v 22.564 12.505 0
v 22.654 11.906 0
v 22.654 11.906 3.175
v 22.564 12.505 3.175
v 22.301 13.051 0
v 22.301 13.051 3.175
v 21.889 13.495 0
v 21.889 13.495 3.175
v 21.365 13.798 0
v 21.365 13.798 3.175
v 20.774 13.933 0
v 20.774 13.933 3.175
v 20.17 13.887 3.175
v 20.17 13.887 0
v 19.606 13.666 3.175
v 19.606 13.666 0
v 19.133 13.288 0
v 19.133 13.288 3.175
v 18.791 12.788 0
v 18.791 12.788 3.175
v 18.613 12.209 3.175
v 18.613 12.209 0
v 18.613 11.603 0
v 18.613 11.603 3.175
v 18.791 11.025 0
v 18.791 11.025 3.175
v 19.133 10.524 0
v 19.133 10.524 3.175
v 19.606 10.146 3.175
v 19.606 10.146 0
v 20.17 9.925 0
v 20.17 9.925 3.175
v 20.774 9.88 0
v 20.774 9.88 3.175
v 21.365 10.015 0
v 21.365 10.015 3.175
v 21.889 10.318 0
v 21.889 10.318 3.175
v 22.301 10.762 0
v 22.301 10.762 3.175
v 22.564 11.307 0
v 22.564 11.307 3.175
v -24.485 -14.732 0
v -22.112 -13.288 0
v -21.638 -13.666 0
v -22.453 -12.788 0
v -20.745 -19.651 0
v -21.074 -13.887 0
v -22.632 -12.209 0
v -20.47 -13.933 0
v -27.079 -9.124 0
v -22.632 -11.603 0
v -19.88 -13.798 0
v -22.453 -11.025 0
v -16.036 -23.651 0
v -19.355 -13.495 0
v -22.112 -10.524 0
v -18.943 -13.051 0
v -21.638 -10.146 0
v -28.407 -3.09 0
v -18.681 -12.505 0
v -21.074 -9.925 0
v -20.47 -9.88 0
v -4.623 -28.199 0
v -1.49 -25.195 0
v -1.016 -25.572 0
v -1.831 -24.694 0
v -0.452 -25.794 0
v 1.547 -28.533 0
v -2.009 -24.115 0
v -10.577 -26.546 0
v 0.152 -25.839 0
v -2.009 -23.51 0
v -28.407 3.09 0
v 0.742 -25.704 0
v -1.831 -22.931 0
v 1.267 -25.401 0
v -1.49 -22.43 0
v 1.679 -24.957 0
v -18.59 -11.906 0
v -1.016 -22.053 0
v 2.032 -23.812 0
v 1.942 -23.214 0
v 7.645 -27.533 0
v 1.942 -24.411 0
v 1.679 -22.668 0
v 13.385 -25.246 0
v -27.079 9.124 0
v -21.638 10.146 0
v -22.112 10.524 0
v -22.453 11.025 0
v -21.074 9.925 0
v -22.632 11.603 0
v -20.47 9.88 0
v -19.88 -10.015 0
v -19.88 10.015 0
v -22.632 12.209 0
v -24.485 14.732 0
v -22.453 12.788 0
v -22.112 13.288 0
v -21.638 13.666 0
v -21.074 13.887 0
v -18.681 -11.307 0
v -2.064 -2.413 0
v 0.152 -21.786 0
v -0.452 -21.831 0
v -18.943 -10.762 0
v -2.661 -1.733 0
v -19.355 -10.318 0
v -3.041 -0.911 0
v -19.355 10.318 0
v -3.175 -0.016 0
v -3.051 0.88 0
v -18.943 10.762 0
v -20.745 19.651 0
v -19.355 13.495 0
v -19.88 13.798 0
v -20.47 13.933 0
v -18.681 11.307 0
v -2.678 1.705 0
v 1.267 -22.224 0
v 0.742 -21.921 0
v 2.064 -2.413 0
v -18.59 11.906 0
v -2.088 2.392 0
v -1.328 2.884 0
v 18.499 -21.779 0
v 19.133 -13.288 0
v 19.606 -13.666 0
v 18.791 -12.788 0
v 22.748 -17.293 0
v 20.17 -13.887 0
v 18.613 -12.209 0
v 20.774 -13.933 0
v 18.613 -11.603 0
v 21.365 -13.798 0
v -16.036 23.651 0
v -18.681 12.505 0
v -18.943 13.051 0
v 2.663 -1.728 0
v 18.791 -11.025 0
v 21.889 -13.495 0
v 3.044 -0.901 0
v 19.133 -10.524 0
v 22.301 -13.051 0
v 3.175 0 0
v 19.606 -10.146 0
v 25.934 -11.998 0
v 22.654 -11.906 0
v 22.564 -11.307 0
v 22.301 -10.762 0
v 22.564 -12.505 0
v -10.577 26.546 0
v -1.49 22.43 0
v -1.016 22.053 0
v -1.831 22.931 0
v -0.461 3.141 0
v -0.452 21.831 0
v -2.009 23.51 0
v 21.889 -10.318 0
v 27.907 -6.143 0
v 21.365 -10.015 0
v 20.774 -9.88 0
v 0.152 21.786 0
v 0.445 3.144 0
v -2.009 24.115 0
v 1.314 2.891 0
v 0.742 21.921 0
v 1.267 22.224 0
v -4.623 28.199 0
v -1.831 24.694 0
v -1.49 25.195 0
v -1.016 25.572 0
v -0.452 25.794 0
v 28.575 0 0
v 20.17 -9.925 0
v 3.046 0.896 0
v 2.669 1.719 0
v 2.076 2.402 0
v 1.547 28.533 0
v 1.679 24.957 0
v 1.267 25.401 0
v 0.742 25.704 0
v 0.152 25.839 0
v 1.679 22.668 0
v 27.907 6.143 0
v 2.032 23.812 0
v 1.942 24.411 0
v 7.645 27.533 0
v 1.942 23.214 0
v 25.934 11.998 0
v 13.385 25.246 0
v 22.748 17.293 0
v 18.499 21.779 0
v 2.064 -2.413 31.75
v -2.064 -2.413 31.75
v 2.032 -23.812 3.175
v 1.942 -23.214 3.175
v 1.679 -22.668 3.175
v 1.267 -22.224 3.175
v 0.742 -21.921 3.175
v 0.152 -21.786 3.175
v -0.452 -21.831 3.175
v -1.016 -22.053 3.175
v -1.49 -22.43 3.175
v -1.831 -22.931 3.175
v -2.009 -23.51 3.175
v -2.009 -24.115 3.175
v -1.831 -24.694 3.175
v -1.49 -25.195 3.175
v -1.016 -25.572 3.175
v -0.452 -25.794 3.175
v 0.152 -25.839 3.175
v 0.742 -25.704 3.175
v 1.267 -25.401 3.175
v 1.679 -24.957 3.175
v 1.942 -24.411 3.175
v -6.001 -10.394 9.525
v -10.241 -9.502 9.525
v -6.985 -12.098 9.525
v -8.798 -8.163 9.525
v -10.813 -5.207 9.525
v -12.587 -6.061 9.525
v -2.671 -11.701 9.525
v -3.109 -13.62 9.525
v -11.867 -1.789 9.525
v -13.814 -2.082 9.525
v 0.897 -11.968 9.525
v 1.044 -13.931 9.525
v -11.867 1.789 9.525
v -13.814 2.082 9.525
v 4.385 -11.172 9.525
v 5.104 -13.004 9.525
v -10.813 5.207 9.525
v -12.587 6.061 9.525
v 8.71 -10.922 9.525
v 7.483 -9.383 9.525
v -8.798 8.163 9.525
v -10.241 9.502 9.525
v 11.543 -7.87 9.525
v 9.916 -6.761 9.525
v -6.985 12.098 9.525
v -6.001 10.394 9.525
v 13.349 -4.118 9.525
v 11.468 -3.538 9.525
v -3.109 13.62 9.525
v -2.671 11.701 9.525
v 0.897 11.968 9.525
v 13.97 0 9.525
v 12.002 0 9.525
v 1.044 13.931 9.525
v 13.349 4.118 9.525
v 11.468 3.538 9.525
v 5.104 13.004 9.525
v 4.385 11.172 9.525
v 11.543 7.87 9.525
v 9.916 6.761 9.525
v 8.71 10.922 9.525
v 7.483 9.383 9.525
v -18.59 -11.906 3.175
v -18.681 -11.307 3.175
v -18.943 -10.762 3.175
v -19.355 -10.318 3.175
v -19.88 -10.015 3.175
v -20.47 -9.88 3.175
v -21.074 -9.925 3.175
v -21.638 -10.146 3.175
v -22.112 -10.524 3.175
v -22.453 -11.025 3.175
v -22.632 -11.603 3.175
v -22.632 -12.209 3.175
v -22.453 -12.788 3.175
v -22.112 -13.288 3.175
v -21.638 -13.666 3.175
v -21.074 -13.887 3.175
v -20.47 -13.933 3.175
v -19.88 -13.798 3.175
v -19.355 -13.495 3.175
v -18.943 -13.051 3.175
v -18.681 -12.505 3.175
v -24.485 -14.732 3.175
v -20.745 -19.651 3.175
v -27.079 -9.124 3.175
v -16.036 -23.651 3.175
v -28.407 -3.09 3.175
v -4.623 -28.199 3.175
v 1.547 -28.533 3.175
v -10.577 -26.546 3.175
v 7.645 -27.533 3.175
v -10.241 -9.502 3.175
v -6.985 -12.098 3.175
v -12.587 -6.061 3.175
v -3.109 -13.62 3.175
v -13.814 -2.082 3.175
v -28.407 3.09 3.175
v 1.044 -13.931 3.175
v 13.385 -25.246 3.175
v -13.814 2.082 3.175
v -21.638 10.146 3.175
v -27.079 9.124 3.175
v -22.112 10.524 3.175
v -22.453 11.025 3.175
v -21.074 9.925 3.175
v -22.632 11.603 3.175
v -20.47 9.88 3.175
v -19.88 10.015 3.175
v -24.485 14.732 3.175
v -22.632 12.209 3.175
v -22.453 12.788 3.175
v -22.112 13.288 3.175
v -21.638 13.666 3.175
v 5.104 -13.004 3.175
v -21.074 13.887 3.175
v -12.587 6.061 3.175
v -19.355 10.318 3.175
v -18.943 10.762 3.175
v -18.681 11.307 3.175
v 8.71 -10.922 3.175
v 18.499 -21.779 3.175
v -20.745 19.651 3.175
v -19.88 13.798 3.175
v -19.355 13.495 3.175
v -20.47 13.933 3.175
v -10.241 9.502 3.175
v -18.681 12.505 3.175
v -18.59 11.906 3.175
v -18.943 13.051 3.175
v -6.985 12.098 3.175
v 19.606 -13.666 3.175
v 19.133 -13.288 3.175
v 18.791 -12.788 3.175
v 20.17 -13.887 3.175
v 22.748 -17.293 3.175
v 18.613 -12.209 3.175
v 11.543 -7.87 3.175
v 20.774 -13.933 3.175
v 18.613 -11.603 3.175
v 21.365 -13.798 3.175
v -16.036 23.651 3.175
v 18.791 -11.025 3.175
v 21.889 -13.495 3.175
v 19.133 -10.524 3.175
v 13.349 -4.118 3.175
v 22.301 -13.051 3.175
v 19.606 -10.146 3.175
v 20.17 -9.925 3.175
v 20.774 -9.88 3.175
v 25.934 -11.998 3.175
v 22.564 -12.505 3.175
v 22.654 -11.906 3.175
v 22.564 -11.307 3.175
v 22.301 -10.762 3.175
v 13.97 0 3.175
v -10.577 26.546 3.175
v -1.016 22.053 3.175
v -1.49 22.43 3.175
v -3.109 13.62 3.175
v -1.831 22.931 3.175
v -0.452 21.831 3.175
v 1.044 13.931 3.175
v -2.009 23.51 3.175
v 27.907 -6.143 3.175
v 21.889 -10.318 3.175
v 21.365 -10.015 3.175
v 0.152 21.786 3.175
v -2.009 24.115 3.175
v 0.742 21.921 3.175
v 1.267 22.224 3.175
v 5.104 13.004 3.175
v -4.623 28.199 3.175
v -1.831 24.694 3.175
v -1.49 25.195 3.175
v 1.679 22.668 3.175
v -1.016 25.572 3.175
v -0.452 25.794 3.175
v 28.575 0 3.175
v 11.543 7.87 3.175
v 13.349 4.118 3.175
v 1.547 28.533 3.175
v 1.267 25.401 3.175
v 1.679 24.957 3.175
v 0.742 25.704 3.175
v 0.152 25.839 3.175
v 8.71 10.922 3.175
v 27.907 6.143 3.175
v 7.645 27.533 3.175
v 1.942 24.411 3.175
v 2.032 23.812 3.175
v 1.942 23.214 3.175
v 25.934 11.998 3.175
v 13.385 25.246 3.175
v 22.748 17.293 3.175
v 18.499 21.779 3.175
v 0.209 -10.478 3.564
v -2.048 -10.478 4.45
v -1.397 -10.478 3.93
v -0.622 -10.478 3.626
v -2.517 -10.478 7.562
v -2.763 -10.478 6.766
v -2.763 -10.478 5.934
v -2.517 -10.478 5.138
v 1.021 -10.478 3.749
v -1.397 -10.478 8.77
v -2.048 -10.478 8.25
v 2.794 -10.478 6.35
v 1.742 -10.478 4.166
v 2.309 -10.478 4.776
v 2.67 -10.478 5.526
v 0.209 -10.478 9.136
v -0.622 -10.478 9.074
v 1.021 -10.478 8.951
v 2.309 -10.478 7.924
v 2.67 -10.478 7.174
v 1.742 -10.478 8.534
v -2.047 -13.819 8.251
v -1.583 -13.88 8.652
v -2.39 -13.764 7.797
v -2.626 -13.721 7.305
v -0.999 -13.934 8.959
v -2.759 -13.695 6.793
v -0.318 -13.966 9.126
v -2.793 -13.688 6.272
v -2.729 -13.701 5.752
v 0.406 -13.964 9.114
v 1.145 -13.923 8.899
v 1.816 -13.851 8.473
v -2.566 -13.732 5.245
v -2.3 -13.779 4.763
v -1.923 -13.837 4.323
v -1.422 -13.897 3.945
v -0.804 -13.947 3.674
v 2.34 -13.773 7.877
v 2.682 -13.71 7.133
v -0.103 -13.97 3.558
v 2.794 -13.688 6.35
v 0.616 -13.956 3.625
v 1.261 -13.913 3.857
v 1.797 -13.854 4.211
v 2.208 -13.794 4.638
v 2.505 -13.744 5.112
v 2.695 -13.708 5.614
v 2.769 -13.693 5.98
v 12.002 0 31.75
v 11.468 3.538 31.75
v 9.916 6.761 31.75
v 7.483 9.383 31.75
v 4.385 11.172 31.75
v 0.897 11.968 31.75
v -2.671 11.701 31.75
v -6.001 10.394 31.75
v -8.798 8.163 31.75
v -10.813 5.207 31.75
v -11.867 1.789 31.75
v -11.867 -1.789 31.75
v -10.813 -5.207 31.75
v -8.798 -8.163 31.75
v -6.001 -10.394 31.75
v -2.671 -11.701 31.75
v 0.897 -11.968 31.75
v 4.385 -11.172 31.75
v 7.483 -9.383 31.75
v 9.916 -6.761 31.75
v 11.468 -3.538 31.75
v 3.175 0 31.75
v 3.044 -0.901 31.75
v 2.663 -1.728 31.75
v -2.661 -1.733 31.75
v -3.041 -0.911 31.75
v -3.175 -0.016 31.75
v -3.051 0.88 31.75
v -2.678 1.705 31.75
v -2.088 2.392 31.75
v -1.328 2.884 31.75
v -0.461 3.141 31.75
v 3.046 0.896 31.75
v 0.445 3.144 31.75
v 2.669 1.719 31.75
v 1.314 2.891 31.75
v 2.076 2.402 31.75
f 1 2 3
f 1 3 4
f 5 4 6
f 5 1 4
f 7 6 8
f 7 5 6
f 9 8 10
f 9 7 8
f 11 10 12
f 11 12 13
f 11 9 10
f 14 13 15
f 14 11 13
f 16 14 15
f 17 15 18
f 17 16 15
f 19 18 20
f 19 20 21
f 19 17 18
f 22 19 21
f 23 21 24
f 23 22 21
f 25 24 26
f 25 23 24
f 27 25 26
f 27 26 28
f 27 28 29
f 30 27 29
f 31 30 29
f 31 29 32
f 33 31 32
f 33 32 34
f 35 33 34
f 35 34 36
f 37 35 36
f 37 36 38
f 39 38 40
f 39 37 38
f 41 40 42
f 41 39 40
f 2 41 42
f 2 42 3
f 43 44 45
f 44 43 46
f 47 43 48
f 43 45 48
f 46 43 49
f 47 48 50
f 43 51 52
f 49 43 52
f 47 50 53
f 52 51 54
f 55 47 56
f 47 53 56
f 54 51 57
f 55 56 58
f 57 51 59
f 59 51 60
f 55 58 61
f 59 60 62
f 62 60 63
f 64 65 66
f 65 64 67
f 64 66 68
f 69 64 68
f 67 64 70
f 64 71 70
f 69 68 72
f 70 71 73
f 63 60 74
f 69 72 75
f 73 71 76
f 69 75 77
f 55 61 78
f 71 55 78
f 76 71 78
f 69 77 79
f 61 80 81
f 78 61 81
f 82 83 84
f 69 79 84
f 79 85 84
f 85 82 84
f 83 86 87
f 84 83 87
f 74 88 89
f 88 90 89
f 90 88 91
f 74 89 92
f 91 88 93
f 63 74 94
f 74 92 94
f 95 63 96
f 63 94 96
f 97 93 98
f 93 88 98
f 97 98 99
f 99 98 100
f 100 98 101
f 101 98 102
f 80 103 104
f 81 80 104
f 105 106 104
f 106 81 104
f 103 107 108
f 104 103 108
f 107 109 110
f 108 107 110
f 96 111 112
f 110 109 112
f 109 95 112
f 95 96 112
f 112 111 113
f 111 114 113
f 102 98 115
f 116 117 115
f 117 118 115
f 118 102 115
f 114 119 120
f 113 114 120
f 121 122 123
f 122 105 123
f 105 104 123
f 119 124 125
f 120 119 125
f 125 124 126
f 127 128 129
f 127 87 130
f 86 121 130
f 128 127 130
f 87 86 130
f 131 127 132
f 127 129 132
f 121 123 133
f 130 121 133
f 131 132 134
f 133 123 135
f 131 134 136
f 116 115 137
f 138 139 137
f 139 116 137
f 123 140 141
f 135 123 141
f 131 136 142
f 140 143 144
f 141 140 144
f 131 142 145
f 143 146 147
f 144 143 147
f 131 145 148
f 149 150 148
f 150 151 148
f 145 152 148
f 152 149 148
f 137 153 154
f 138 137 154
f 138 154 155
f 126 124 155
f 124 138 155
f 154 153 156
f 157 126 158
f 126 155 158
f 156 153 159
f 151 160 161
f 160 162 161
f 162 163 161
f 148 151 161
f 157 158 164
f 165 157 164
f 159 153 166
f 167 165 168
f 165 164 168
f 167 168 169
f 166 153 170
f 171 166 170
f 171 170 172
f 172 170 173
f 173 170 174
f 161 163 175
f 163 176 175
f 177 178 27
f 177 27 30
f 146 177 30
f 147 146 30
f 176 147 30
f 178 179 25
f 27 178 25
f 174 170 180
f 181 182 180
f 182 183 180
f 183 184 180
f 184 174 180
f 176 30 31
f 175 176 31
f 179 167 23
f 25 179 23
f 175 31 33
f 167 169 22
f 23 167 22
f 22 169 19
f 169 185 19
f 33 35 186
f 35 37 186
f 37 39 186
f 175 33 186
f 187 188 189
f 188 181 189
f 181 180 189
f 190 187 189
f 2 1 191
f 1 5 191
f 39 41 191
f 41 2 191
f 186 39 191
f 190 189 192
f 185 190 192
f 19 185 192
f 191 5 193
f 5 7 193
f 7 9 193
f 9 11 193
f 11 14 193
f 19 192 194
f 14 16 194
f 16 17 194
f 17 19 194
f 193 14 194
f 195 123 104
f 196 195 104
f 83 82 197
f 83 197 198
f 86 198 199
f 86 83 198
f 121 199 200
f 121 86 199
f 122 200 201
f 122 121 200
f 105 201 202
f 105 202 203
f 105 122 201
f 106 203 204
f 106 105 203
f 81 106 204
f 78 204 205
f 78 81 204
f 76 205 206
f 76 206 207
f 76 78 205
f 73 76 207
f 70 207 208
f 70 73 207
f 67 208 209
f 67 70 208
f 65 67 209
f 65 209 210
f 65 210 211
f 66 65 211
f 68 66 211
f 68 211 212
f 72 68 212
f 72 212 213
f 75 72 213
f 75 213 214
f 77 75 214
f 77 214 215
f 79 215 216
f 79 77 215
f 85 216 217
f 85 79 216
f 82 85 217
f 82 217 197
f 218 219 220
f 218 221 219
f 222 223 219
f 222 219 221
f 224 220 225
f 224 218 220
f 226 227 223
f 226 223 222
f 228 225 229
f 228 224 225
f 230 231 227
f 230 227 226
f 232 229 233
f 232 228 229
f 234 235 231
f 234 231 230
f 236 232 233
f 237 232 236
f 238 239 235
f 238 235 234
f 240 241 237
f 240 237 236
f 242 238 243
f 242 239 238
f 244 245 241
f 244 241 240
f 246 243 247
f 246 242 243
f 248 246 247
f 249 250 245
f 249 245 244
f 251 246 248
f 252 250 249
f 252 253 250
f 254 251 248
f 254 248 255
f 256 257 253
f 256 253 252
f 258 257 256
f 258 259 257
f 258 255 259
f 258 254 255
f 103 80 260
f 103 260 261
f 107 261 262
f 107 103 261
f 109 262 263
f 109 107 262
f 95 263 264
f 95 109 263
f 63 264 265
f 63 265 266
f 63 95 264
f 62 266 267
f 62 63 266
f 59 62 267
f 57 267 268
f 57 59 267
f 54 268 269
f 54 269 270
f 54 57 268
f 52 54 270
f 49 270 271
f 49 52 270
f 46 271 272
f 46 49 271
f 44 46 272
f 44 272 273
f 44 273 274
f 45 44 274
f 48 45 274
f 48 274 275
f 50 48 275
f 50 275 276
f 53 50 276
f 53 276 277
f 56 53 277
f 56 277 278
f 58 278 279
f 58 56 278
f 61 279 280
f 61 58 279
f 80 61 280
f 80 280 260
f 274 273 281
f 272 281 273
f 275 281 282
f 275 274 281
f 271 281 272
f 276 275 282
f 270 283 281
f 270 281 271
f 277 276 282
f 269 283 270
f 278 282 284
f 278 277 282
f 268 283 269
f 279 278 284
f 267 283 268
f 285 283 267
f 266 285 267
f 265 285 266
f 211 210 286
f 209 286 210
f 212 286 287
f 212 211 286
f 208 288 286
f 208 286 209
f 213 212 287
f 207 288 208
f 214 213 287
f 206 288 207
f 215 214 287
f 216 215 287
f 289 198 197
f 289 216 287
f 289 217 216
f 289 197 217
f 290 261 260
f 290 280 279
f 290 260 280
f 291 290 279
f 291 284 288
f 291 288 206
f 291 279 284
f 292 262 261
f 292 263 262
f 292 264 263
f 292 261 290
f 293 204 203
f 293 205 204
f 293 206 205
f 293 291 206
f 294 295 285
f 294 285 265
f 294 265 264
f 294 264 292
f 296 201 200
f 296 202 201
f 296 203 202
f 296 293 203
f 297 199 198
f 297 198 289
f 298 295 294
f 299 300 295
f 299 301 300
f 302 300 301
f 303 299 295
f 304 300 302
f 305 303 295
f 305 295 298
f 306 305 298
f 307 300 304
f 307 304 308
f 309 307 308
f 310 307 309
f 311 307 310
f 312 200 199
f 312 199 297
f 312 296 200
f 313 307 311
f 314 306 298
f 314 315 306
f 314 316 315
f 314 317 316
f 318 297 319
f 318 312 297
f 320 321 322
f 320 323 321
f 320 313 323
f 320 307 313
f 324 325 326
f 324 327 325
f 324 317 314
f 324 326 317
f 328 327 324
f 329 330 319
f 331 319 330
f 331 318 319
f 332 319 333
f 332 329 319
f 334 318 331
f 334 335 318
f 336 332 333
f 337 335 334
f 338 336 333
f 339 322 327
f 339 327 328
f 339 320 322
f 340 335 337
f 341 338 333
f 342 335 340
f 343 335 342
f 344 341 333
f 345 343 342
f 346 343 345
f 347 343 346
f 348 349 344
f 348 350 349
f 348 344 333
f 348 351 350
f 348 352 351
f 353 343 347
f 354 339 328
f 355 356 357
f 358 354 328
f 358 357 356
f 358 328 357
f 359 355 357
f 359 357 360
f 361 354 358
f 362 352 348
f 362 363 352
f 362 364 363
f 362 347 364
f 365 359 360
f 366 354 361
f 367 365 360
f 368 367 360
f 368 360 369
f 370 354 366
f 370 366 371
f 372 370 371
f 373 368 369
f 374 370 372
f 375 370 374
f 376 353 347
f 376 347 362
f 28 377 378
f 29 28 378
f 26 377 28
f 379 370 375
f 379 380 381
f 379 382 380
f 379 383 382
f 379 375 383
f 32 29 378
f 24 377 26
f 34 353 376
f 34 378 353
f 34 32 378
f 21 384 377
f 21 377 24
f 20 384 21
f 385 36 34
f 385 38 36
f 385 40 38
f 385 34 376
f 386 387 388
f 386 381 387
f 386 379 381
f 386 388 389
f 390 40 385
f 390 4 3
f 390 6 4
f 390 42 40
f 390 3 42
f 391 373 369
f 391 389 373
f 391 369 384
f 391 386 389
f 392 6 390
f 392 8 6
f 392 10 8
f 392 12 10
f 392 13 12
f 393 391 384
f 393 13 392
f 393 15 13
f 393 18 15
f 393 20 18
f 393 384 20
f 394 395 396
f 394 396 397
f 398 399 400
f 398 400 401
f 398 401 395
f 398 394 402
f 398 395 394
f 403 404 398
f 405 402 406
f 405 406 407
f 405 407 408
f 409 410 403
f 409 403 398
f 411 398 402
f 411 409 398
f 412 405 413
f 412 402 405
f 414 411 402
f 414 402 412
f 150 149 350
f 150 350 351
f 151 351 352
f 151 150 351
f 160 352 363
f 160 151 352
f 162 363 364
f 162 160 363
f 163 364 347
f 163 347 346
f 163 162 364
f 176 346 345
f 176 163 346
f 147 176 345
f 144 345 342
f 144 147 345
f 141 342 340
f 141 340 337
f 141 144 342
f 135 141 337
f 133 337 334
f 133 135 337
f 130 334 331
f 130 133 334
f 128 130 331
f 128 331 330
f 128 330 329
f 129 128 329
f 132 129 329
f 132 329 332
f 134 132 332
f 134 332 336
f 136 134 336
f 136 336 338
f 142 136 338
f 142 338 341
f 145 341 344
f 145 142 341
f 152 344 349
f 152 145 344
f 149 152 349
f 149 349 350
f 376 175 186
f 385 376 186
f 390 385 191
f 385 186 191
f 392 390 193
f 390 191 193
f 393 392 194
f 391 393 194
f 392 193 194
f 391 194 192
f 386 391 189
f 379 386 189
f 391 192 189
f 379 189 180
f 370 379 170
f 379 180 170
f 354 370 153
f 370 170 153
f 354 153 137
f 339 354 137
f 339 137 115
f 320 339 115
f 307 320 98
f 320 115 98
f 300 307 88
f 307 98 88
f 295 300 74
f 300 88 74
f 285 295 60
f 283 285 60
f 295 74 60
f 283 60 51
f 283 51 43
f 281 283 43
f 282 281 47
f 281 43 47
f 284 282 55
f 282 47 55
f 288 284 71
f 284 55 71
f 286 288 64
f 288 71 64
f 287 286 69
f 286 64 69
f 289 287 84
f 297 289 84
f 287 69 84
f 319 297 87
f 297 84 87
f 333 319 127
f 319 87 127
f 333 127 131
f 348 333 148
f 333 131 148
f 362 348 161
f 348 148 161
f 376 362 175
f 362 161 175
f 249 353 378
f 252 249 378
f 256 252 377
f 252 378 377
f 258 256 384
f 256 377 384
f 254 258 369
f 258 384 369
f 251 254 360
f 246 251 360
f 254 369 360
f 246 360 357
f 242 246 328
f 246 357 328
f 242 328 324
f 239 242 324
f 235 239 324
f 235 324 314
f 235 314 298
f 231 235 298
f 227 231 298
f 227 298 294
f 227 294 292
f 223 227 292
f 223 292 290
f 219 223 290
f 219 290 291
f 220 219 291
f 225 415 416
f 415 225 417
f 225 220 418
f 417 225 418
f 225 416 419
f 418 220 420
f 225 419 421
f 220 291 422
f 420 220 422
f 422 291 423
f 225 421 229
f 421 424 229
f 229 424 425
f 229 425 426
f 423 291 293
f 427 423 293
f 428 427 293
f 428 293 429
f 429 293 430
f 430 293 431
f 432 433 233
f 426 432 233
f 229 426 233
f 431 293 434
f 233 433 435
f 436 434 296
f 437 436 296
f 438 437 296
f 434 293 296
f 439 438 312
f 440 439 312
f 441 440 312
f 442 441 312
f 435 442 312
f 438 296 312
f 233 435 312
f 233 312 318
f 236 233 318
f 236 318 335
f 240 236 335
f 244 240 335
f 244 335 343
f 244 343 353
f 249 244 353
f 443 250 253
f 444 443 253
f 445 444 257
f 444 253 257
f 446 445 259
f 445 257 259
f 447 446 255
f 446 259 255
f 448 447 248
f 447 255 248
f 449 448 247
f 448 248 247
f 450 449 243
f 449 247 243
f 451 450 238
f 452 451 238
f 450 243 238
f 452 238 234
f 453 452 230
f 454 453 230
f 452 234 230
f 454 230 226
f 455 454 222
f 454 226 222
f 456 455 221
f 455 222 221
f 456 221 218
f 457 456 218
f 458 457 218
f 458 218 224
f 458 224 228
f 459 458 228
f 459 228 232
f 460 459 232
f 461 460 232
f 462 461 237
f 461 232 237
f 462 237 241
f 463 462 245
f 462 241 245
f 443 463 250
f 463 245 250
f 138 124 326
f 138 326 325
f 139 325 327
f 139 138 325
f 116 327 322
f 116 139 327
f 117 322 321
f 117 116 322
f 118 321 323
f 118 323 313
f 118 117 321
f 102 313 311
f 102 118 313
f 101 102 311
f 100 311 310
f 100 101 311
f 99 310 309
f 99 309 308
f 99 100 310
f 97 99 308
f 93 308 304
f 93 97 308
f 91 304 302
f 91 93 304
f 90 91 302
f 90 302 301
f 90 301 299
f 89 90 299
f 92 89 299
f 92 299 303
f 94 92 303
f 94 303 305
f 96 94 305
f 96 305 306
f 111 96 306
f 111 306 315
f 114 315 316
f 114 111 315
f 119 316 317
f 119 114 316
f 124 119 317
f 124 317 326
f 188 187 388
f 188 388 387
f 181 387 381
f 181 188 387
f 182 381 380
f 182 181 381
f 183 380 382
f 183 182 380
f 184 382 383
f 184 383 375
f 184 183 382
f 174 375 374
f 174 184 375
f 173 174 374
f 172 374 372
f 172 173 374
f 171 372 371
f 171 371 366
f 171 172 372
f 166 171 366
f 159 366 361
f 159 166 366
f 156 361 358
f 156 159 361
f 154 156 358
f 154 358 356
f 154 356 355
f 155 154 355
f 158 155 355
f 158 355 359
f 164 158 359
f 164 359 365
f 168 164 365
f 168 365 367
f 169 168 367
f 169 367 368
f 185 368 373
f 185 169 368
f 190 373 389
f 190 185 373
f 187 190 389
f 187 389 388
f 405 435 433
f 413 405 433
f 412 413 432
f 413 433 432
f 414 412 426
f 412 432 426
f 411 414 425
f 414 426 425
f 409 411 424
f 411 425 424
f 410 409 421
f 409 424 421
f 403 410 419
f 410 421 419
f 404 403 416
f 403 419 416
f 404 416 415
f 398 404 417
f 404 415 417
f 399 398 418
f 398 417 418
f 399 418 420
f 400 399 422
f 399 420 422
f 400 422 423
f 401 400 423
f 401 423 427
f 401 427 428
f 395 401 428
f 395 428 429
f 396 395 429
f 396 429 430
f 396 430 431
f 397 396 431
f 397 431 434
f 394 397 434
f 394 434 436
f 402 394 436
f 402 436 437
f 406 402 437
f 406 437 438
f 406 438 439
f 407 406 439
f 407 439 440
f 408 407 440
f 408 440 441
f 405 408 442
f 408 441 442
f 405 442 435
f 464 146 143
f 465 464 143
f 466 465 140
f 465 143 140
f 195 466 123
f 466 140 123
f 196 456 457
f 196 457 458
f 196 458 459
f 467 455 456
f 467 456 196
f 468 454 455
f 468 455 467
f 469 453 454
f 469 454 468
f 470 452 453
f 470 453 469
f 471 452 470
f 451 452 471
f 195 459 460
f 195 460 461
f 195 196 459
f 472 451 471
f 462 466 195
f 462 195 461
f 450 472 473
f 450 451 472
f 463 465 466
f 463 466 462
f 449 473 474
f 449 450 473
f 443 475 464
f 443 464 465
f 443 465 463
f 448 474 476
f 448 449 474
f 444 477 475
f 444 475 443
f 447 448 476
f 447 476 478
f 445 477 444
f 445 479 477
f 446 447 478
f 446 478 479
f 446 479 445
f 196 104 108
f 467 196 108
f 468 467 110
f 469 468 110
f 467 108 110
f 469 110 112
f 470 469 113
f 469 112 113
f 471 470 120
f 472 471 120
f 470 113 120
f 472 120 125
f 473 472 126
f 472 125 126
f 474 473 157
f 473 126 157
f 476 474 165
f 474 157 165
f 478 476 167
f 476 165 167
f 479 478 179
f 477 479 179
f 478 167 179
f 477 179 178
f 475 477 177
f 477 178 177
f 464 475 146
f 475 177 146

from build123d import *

# Parameters (mm, degrees)
F0_R      = 28.575
F0_R_2    = 2.032
F1_DEPTH  = 3.175
F2_R      = 13.97
F3_DEPTH  = 6.35
F4_R      = 12.0015
F5_DEPTH  = 22.225
F7_DEPTH  = 31.75
F9_R      = 1.4224
F10_DEPTH = 0.3175
F11_R     = 2.794
F12_DEPTH = 3.81


with BuildPart() as f1:
    # F0 (on Top) → F1 (new body)
    with BuildSketch(Plane.XY):
        Circle(F0_R)
        with Locations((-20.6222299276, -11.90625)):
            Circle(F0_R_2, mode=Mode.SUBTRACT)
        with Locations((0, -23.8125)):
            Circle(F0_R_2, mode=Mode.SUBTRACT)
        with Locations((20.6222299276, -11.90625)):
            Circle(F0_R_2, mode=Mode.SUBTRACT)
        with Locations((-20.6222299276, 11.90625)):
            Circle(F0_R_2, mode=Mode.SUBTRACT)
        with Locations((20.6222299276, 11.90625)):
            Circle(F0_R_2, mode=Mode.SUBTRACT)
        with Locations((0, 23.8125)):
            Circle(F0_R_2, mode=Mode.SUBTRACT)
    extrude(amount=F1_DEPTH)

    # F2 (on face) → F3 (join)
    with BuildSketch(Plane.XY.offset(3.175)):
        Circle(F2_R)
    extrude(amount=F3_DEPTH)

    # F4 (on face) → F5 (join)
    with BuildSketch(Plane.XY.offset(9.525)):
        Circle(F4_R)
    extrude(amount=F5_DEPTH)

    # F6 (on face) → F7 (cut, through all)
    with BuildSketch(Plane(origin=(0, 0, 0), x_dir=(1, 0, 0), z_dir=(0, 0, -1))):
        with BuildLine():
            ThreePointArc((-2.0635057548, 2.413), (-1.3283437485, -2.8837697352), (3.175, 0))
            ThreePointArc((3.175, 0), (2.8837697352, 1.3283437485), (2.0635057548, 2.413))
            Line((2.0635057548, 2.413), (0, 2.413))
            Line((0, 2.413), (-2.0635057548, 2.413))
        make_face()
    extrude(amount=-F7_DEPTH, mode=Mode.SUBTRACT)

    # F9 (on offset) → F10 (cut, through all)
    with BuildSketch(Plane.XZ.offset(14.2875)):
        with Locations((0, 6.35)):
            Circle(F9_R)
    extrude(amount=-F10_DEPTH, mode=Mode.SUBTRACT)

    # F11 (on offset) → F12 (cut)
    with BuildSketch(Plane.XZ.offset(14.2875)):
        with Locations((0, 6.35)):
            Circle(F11_R)
    extrude(amount=-F12_DEPTH, mode=Mode.SUBTRACT)


solid = f1.part
